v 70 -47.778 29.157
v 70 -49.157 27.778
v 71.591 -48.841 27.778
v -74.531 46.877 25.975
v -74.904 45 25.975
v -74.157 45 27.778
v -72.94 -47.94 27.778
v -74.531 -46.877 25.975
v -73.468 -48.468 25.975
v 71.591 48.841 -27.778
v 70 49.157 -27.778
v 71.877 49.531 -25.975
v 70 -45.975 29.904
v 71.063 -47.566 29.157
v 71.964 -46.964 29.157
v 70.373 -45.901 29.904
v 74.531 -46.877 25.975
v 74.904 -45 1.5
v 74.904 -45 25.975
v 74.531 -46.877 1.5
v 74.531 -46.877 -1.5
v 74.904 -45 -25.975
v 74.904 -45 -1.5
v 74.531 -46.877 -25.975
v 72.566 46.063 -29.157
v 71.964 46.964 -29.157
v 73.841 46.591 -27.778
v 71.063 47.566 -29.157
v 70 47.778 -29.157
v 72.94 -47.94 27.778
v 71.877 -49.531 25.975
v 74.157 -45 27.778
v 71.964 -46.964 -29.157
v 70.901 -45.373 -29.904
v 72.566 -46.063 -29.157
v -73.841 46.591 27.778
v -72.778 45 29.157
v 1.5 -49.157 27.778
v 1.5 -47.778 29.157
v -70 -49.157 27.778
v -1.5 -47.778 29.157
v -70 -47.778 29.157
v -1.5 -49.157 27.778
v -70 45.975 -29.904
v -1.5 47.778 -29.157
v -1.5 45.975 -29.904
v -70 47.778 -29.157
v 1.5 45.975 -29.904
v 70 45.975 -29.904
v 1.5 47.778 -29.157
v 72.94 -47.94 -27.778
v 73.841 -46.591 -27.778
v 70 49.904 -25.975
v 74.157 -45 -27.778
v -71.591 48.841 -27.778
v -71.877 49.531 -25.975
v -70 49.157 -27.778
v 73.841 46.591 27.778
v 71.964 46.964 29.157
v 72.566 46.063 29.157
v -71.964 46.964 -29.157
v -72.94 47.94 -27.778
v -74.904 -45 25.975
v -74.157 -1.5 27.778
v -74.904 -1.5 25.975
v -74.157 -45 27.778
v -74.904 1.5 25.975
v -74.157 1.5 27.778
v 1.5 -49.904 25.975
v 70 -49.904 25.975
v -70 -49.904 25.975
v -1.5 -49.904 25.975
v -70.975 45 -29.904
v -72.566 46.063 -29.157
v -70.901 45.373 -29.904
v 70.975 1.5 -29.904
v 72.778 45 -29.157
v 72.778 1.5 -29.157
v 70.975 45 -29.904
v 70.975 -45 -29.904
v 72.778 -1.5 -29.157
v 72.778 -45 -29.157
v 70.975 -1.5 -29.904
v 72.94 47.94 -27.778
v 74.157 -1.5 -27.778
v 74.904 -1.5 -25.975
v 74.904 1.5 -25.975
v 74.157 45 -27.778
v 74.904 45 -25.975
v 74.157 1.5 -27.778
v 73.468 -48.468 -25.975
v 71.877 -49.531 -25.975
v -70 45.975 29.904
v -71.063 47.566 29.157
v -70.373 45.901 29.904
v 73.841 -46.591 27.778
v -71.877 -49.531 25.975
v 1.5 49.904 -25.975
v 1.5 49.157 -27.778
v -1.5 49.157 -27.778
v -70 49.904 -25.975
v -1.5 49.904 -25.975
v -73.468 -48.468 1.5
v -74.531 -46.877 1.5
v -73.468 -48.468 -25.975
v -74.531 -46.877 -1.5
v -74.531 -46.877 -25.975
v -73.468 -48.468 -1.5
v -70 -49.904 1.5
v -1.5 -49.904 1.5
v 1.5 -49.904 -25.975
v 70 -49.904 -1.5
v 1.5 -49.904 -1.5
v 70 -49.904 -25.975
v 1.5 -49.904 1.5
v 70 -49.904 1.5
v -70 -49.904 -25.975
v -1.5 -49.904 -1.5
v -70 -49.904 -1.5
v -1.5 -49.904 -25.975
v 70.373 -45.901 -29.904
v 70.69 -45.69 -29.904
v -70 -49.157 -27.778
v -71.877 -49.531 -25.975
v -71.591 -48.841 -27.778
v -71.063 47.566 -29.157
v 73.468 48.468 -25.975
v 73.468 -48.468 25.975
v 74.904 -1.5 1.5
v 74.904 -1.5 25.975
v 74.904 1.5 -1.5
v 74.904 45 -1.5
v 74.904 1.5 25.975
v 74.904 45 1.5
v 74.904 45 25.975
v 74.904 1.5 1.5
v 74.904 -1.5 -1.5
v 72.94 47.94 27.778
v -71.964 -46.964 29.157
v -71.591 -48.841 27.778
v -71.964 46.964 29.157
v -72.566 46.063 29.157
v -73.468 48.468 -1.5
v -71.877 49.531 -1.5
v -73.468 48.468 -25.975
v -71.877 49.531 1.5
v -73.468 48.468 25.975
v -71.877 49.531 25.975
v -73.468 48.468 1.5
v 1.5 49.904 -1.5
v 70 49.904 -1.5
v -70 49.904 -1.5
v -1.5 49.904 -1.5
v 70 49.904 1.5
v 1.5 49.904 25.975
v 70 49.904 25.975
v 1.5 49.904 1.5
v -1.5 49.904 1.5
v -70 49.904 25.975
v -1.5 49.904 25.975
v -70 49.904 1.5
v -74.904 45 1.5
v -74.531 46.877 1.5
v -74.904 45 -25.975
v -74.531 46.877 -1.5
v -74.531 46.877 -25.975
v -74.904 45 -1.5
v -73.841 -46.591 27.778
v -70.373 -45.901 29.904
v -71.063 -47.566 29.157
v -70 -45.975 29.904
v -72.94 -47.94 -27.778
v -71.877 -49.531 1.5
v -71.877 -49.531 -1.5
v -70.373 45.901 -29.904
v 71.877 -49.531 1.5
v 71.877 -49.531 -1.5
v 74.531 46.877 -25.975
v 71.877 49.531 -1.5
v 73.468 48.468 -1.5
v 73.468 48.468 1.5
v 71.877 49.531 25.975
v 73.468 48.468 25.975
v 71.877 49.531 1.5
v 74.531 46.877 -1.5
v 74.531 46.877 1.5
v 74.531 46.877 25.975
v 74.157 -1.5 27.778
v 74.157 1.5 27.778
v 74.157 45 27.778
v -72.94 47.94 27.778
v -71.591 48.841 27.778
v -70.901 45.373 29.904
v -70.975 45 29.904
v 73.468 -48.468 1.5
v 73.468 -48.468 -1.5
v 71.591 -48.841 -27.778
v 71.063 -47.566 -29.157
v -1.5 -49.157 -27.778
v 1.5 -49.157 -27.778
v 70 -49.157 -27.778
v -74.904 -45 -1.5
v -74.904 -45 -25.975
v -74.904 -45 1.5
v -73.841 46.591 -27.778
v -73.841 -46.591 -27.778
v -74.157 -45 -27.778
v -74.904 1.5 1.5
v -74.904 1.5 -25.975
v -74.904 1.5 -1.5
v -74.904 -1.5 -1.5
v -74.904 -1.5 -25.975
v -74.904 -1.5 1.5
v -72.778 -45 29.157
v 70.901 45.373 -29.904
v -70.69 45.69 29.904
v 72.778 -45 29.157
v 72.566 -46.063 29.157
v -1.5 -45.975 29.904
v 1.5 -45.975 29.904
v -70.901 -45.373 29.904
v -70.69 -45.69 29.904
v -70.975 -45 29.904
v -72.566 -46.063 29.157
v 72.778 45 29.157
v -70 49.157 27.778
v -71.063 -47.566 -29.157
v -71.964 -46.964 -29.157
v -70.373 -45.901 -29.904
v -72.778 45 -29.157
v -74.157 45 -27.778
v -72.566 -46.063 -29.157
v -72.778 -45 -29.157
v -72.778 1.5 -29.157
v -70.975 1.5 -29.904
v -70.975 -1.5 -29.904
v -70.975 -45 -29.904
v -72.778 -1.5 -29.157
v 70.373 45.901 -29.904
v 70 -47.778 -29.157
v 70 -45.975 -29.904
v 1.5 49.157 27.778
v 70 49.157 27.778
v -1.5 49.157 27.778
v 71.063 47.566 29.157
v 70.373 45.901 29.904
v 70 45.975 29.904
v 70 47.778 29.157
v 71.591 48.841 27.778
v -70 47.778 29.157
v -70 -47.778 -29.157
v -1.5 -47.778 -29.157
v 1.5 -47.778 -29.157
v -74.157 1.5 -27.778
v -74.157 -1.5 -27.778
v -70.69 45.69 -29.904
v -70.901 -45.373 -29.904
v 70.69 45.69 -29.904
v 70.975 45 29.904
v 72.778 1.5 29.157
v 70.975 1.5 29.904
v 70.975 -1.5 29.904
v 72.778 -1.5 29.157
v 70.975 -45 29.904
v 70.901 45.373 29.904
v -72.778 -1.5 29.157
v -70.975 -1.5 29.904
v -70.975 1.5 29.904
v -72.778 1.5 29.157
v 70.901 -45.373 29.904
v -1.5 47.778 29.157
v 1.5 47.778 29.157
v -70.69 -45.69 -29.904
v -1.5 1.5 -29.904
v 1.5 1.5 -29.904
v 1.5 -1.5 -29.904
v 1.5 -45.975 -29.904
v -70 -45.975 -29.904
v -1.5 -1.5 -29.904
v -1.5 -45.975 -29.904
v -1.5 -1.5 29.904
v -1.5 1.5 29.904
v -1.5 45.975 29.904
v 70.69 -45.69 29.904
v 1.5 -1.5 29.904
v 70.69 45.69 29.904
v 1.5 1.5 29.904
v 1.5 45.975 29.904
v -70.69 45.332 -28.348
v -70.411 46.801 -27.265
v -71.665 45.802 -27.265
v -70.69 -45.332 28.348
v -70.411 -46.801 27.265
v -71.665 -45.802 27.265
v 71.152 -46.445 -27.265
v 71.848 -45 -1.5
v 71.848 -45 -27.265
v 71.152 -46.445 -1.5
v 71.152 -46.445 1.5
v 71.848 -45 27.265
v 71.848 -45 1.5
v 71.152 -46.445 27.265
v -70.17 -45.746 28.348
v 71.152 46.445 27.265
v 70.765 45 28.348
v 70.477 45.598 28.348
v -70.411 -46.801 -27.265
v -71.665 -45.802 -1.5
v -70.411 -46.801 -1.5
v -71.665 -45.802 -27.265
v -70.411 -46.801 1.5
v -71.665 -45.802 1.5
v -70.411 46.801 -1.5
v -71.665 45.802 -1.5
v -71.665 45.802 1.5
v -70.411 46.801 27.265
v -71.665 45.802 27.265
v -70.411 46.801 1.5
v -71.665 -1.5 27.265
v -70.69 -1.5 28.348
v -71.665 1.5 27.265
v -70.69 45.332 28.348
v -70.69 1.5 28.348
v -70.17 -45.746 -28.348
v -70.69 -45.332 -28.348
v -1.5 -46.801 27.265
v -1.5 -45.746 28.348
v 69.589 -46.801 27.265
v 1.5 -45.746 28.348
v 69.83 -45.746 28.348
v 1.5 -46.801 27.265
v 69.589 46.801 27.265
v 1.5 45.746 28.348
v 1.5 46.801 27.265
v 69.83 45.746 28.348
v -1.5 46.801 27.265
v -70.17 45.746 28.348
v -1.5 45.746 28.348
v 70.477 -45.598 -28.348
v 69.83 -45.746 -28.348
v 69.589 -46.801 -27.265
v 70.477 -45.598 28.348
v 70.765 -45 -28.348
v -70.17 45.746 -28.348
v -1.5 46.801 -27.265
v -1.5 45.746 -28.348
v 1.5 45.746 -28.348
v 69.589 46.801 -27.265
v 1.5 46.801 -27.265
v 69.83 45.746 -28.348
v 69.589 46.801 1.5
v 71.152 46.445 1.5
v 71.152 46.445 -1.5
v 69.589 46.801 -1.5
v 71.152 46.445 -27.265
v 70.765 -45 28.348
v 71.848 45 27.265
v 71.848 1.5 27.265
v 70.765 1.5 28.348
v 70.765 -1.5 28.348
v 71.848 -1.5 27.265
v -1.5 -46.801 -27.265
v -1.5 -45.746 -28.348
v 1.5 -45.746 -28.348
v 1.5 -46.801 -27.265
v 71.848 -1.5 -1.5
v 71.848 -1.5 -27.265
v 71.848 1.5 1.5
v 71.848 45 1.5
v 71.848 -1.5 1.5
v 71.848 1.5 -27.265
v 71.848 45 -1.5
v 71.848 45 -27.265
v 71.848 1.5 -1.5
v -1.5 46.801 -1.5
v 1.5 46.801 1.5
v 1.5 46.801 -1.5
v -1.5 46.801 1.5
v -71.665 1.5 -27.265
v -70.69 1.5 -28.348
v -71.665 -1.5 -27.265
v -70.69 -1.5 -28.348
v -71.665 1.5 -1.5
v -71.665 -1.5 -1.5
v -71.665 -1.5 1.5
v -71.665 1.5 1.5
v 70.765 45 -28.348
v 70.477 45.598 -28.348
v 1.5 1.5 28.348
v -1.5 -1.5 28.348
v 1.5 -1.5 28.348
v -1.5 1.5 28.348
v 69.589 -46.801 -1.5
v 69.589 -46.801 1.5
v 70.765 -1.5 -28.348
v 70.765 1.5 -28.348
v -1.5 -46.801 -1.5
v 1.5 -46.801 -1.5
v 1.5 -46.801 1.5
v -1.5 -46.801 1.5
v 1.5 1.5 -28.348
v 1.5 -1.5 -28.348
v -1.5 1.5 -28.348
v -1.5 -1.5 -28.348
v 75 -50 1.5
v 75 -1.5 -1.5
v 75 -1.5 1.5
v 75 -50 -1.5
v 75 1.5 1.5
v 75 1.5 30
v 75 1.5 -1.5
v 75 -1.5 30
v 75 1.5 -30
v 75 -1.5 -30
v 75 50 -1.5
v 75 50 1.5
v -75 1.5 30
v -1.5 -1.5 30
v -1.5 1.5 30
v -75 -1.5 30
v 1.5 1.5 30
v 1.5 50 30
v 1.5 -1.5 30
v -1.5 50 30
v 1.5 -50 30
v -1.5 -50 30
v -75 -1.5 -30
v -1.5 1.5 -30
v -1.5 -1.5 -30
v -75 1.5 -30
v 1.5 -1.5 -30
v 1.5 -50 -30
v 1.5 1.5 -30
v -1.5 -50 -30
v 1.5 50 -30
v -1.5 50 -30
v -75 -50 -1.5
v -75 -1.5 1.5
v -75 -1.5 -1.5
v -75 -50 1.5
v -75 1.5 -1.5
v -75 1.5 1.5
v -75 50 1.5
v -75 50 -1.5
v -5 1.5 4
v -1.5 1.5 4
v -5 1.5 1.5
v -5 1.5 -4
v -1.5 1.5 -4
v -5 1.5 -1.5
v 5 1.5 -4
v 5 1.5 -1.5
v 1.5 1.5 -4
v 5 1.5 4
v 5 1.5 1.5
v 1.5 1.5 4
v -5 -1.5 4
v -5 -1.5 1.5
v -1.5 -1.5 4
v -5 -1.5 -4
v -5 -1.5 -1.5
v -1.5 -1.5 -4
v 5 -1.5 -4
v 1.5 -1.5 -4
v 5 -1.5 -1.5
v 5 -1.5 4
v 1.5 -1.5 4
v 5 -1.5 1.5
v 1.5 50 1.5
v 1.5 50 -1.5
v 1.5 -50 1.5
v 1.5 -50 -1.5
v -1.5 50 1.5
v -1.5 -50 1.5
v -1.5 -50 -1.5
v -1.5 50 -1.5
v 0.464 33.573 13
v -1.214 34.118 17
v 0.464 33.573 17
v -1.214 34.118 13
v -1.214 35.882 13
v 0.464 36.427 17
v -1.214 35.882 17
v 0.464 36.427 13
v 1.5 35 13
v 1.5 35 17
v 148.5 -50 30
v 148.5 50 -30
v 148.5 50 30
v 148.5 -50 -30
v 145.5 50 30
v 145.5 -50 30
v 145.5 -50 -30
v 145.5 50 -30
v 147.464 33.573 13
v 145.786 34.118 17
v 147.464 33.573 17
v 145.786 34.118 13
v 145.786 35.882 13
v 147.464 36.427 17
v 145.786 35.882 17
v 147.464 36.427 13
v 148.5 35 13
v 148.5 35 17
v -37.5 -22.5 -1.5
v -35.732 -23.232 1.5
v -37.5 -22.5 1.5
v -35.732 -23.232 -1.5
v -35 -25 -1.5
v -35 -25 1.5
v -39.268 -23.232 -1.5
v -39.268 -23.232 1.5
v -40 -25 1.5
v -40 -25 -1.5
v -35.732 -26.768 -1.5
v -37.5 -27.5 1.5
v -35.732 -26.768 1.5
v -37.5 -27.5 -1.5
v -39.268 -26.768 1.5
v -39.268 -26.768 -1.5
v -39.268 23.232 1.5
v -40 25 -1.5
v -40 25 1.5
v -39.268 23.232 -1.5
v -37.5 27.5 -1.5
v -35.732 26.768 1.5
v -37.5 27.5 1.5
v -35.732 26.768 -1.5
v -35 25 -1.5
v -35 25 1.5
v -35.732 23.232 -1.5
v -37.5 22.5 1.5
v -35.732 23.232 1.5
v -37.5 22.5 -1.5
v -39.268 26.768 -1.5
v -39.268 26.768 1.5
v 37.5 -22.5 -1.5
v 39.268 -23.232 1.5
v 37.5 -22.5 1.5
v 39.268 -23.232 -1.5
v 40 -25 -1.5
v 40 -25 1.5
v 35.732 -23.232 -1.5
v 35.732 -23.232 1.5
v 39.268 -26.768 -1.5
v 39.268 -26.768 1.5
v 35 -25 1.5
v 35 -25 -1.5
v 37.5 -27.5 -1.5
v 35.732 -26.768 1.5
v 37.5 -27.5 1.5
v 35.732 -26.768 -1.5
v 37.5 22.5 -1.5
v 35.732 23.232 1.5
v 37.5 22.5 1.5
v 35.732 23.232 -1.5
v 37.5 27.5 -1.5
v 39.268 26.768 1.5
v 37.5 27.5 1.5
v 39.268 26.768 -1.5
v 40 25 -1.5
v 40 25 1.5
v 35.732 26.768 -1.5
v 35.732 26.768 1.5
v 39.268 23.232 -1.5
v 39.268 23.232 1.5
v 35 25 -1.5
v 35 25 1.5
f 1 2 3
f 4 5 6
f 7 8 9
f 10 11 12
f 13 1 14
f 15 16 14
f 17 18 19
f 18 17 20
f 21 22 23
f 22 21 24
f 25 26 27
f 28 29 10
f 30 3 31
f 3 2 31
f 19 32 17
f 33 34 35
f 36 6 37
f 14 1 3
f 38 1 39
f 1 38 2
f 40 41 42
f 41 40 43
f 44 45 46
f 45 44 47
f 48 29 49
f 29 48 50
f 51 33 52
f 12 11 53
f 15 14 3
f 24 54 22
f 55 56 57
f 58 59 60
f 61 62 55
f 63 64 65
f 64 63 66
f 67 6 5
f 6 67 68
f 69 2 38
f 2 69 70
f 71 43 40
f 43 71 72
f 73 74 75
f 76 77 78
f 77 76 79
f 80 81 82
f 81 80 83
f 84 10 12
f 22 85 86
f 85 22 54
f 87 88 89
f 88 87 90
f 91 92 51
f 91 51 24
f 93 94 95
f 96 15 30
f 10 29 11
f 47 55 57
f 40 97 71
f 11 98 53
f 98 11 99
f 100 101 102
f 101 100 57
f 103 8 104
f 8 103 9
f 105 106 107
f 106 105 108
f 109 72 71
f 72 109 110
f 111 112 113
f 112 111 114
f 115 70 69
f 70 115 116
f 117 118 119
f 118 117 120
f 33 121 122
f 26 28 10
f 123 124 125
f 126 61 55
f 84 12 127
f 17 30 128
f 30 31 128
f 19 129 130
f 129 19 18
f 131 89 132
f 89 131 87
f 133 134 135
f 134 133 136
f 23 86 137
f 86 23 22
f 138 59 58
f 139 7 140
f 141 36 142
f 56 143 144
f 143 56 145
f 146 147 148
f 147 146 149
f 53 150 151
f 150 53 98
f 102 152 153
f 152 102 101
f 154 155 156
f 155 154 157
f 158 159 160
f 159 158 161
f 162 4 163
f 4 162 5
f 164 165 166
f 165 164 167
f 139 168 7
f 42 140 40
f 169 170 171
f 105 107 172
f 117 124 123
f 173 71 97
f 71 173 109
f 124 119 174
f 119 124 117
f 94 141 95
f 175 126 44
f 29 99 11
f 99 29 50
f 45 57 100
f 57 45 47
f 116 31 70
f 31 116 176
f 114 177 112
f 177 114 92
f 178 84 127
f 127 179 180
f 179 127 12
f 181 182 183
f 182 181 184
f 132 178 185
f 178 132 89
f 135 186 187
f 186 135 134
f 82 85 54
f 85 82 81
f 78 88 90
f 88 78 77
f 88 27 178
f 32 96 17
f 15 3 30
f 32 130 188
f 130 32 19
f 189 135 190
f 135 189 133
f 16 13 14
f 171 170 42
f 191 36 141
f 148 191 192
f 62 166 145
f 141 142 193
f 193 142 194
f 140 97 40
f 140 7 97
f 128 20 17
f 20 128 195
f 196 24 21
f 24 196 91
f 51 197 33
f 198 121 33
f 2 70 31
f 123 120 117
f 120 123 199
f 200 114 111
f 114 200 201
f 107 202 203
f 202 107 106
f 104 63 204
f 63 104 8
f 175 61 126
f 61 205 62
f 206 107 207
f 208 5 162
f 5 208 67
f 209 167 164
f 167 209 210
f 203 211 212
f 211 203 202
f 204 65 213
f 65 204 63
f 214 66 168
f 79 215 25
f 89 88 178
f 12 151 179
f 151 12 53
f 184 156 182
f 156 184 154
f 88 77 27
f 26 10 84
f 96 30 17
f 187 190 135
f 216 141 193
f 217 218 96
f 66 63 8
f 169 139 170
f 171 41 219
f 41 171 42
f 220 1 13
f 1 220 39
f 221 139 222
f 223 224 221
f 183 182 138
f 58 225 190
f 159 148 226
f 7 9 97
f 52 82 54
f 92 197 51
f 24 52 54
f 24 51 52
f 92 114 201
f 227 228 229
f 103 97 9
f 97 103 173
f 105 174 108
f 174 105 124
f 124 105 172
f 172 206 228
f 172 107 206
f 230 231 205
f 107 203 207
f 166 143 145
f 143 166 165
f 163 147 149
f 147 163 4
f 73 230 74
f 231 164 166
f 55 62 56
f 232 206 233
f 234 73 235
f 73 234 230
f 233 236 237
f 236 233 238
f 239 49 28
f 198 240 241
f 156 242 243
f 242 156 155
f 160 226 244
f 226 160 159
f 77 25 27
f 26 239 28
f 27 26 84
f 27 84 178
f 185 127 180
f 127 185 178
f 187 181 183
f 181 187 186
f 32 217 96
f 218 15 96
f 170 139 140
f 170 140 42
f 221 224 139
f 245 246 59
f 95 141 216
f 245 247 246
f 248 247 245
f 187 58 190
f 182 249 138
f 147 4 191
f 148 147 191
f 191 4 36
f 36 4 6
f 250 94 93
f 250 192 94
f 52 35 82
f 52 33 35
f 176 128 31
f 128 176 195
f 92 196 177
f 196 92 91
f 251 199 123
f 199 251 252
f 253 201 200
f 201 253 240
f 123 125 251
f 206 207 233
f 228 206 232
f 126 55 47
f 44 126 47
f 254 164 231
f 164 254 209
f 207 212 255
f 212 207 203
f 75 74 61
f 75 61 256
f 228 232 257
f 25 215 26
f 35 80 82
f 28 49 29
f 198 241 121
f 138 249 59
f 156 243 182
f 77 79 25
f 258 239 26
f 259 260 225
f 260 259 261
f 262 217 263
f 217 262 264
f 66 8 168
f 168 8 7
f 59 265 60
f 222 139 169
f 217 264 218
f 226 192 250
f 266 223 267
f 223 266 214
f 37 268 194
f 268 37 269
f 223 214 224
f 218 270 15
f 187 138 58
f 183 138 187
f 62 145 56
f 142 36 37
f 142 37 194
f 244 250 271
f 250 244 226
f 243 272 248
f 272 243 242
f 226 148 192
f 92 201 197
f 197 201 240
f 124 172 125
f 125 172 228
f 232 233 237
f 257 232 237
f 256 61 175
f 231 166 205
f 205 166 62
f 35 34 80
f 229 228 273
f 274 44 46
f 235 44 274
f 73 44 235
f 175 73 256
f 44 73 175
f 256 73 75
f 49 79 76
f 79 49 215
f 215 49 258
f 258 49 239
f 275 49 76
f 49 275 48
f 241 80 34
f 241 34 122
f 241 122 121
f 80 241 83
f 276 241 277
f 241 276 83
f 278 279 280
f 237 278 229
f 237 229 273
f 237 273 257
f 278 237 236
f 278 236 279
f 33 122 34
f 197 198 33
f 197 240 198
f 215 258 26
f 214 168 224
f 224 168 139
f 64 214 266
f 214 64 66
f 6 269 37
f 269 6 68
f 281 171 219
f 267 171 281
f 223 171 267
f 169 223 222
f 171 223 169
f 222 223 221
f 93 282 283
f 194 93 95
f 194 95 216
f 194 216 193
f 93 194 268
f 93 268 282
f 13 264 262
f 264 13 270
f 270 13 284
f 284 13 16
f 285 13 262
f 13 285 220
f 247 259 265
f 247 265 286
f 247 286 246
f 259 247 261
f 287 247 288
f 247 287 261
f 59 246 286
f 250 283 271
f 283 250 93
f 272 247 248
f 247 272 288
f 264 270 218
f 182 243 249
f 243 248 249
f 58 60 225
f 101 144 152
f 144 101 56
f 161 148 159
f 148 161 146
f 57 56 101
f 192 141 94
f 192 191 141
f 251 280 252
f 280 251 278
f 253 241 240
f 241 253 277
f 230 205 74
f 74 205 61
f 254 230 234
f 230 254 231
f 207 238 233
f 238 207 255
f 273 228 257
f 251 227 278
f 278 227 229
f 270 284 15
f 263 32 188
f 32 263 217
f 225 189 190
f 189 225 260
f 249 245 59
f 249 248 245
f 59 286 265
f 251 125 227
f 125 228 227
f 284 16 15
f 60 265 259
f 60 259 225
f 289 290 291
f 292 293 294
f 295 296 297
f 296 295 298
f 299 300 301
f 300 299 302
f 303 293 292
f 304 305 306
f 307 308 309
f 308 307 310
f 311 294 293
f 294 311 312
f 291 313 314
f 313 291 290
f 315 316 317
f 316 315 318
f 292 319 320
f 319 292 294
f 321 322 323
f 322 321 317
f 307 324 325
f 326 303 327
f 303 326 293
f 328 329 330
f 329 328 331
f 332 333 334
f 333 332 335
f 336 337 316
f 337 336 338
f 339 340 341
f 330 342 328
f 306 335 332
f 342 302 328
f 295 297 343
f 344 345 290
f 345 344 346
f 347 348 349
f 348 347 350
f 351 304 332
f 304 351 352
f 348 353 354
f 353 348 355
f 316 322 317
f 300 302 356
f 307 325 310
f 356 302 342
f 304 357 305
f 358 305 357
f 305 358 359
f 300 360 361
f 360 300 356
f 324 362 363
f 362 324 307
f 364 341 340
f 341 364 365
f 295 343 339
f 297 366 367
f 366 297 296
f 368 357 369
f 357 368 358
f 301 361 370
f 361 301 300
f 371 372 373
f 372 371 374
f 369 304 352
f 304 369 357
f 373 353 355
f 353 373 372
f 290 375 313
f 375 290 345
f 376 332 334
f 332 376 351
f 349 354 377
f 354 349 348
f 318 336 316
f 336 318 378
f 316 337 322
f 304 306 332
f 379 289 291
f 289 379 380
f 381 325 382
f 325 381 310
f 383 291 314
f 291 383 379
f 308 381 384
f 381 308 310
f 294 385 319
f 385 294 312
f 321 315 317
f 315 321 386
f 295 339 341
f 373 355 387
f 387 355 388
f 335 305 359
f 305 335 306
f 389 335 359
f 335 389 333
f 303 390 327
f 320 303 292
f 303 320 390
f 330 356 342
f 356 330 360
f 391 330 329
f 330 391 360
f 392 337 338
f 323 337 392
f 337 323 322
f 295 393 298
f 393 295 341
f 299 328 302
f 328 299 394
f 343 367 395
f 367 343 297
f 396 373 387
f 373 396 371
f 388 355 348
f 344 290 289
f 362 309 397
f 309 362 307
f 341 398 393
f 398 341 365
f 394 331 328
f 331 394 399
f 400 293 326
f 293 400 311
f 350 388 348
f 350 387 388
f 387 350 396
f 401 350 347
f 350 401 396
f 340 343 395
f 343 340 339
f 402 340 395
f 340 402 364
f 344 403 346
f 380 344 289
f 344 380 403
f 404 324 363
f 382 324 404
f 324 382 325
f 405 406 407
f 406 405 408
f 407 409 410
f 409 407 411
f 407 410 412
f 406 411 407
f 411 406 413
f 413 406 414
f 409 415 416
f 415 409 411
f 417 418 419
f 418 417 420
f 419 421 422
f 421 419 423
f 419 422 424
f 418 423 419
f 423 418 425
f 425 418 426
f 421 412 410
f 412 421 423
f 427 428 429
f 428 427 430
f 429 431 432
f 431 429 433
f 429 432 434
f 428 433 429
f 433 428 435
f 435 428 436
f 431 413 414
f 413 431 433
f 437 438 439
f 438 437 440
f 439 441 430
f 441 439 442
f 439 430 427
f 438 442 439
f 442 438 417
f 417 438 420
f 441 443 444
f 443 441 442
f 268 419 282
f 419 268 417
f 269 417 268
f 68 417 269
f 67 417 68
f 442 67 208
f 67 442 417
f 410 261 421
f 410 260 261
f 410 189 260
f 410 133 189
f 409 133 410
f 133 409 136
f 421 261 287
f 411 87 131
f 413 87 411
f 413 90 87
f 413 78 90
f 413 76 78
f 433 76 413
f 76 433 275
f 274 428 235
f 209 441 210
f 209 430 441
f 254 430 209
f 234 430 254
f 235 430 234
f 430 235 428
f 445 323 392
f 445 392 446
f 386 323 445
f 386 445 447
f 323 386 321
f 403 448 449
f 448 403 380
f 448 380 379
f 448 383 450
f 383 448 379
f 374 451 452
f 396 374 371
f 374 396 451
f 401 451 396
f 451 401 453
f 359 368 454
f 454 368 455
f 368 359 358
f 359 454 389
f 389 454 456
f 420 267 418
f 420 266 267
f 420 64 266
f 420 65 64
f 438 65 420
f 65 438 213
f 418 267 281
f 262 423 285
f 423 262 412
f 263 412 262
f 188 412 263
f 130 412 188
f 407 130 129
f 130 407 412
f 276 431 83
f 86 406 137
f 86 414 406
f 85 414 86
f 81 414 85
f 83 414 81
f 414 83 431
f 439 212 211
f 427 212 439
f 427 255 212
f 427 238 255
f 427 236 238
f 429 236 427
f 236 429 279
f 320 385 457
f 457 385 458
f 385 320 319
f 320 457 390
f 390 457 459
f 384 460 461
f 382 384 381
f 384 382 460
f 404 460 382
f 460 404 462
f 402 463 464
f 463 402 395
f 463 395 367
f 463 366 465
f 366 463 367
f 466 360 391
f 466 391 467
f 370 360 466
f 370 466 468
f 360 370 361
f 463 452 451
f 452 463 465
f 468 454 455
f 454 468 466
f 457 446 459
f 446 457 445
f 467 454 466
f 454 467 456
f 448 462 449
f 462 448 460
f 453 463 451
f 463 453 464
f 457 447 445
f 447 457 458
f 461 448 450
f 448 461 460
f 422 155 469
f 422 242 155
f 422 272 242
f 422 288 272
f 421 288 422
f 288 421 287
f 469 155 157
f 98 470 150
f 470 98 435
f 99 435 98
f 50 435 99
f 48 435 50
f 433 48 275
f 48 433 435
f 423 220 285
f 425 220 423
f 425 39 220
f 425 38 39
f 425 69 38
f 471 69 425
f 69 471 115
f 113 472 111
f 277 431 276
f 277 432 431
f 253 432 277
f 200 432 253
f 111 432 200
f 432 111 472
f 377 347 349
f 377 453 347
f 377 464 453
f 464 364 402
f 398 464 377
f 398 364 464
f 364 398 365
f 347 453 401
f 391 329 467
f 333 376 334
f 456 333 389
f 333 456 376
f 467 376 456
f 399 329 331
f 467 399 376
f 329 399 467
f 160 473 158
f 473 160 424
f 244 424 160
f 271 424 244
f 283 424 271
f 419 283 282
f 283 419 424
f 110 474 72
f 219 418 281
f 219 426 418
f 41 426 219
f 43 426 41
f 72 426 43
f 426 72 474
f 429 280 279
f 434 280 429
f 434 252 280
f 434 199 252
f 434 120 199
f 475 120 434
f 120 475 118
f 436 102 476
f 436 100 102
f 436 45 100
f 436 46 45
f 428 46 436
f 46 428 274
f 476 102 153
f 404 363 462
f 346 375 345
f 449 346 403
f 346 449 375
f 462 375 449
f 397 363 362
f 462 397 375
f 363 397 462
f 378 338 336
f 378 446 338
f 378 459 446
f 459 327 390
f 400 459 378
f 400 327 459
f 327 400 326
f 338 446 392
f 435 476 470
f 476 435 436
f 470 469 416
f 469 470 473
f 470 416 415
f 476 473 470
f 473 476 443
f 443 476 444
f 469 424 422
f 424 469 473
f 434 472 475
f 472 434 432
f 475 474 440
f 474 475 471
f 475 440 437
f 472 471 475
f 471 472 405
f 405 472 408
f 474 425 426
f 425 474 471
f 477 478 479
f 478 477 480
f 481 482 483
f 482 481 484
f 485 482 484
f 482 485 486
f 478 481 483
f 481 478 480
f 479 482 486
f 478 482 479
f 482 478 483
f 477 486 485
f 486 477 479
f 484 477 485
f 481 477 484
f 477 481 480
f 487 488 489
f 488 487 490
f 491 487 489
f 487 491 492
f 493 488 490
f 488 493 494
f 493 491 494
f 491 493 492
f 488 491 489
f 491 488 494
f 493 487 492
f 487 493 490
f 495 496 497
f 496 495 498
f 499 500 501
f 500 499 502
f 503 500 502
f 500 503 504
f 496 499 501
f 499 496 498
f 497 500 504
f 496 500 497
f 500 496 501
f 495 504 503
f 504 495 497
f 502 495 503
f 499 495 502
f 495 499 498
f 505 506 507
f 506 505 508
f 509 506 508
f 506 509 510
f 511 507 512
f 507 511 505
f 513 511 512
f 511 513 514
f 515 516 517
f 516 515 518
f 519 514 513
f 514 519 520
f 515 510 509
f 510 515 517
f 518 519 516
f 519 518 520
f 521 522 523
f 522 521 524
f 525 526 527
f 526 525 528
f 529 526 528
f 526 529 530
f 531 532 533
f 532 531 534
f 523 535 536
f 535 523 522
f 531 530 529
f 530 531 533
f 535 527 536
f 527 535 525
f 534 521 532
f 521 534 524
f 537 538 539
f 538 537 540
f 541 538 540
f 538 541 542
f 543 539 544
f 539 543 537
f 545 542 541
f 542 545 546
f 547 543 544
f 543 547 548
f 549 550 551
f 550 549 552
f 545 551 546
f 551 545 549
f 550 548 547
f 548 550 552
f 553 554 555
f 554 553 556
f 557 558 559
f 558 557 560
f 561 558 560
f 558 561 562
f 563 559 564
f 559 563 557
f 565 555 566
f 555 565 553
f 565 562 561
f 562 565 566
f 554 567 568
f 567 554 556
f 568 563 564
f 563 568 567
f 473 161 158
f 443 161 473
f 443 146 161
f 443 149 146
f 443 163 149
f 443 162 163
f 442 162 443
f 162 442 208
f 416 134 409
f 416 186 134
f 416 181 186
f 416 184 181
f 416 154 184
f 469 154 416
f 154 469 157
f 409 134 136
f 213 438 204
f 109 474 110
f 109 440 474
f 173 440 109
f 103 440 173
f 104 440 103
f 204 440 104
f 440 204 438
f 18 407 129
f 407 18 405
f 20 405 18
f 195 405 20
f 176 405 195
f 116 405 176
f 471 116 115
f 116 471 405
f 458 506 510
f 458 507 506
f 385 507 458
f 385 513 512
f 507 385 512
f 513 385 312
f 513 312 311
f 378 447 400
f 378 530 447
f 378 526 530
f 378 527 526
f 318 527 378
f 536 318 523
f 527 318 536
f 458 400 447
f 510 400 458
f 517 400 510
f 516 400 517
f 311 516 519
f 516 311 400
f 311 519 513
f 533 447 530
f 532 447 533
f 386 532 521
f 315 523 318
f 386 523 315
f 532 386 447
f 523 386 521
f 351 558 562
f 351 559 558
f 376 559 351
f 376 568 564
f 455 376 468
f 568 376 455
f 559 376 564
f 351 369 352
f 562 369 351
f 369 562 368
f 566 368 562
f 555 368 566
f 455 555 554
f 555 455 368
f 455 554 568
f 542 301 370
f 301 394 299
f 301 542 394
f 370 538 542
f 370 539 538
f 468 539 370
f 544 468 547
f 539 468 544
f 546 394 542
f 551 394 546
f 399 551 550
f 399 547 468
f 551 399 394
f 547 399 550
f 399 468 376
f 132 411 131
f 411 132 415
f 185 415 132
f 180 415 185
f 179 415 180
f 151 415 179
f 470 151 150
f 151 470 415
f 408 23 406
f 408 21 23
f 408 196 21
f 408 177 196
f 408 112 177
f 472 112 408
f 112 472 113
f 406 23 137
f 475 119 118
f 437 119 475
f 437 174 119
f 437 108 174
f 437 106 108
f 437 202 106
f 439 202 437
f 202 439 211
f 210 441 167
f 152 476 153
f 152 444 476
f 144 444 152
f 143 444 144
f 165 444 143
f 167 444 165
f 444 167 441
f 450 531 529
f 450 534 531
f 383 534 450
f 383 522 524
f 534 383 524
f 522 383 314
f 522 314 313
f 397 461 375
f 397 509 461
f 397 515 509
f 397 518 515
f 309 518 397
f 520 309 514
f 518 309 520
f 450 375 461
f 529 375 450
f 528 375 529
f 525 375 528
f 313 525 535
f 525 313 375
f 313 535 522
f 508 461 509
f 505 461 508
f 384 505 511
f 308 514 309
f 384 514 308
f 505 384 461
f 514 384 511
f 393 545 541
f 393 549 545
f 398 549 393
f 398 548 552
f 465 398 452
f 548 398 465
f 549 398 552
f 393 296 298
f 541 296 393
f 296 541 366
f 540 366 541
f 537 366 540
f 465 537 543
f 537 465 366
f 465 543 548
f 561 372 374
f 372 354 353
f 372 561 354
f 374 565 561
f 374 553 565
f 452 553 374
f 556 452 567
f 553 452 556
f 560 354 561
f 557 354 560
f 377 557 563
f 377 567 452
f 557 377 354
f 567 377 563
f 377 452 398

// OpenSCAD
// Blind Date with Bandwidth - Station Enclosure
// Parametric OpenSCAD Design
// Parameters: adjust these values to customize dimensions

// Overall dimensions (mm)
width = 150;
depth = 100;
height = 60;
wall_thickness = 3;
corner_radius = 5;

// Component cutouts
oled_width = 28;
oled_height = 28;
button_diameter = 16;
jack_diameter = 6;

// Ventilation holes
vent_hole_diameter = 5;
vent_spacing = 10;

// Color scheme
color_body = [0, 0, 0];  // Black
color_accent = [0, 0.5, 1];  // Cyan

module rounded_box(w, d, h, r, wall) {
    // Create rounded rectangular box
    minkowski() {
        cube([w - 2*r, d - 2*r, h - 2*r], center=true);
        sphere(r=r);
    }
}

module body() {
    // Outer shell
    difference() {
        rounded_box(width, depth, height, corner_radius, wall_thickness);
        
        // Hollow interior
        rounded_box(
            width - 2*wall_thickness,
            depth - 2*wall_thickness,
            height - wall_thickness, // Leave bottom
            corner_radius - wall_thickness,
            0
        );
    }
}

module front_panel() {
    difference() {
        cube([width, wall_thickness, height], center=true);
        
        // OLED display cutout (centered, 28x28mm)
        translate([0, 0, 0]) {
            cube([oled_width, wall_thickness + 1, oled_height], center=true);
        }
        
        // Button cutout (16mm diameter, centered below display)
        translate([0, -1, -(height/4)]) {
            cylinder(d=button_diameter, h=wall_thickness + 2, center=true);
        }
        
        // Headphone jack (6mm diameter)
        translate([width/2 - 20, -1, 0]) {
            cylinder(d=jack_diameter, h=wall_thickness + 2, center=true);
        }
    }
}

module back_panel() {
    difference() {
        cube([width, wall_thickness, height], center=true);
        
        // USB-C port cutout (10x8mm, centered)
        translate([0, 0, 0]) {
            cube([10, wall_thickness + 1, 8], center=true);
        }
        
        // Ventilation holes (4 holes, 5mm diameter each)
        for (i = [0:3]) {
            x_pos = -width/2 + 30 + (i * vent_spacing);
            translate([x_pos, 0, -height/2 + 10]) {
                cylinder(d=vent_hole_diameter, h=wall_thickness + 1, center=true);
            }
        }
    }
}

module side_panels() {
    // Left panel
    difference() {
        cube([wall_thickness, depth, height], center=true);
        // Mounting holes (optional)
        translate([0, depth/2 - 15, height/2 - 15]) {
            cylinder(d=3, h=wall_thickness + 1, center=true);
        }
    }
    
    // Right panel
    translate([width - wall_thickness, 0, 0]) {
        difference() {
            cube([wall_thickness, depth, height], center=true);
            translate([0, depth/2 - 15, height/2 - 15]) {
                cylinder(d=3, h=wall_thickness + 1, center=true);
            }
        }
    }
}

module bottom_panel() {
    difference() {
        cube([width, depth, wall_thickness], center=true);
        
        // Ventilation holes (arranged in 2x2 grid)
        for (x = [0:1]) {
            for (y = [0:1]) {
                x_pos = -width/4 + (x * width/2);
                y_pos = -depth/4 + (y * depth/2);
                translate([x_pos, y_pos, 0]) {
                    cylinder(d=vent_hole_diameter, h=wall_thickness + 1, center=true);
                }
            }
        }
    }
}

module accent_strips() {
    // Cyan accent strips on edges (cosmetic)
    strip_width = 2;
    
    // Top strips
    color(color_accent) {
        cube([width, strip_width, strip_width], center=true);
        translate([0, 0, height/2 - strip_width/2]) {
            cube([width, strip_width, strip_width], center=true);
        }
    }
}

module pcb_standoffs() {
    // Position and spacing for standoffs
    for (x = [0, 100]) {
        for (y = [0, 60]) {
            x_pos = -width/2 + 20 + x;
            y_pos = -depth/2 + 15 + y;
            translate([x_pos, y_pos, 0]) {
                cylinder(d=3, h=15, center=false);
            }
        }
    }
}

// Main assembly
!color(color_body) {
    body();
    front_panel();
    back_panel();
    side_panels();
    bottom_panel();
}

// Display standoffs (reference only, not part of body)
%pcb_standoffs();

// Render accent strips
%accent_strips();

// Render notes (text annotation)
echo("Enclosure dimensions: 150mm x 100mm x 60mm");
echo("Wall thickness: 3mm");
echo("PCB area: ~80mm x 50mm");
echo("Assembly: Assemble walls, install PCB with standoffs, add panels");
